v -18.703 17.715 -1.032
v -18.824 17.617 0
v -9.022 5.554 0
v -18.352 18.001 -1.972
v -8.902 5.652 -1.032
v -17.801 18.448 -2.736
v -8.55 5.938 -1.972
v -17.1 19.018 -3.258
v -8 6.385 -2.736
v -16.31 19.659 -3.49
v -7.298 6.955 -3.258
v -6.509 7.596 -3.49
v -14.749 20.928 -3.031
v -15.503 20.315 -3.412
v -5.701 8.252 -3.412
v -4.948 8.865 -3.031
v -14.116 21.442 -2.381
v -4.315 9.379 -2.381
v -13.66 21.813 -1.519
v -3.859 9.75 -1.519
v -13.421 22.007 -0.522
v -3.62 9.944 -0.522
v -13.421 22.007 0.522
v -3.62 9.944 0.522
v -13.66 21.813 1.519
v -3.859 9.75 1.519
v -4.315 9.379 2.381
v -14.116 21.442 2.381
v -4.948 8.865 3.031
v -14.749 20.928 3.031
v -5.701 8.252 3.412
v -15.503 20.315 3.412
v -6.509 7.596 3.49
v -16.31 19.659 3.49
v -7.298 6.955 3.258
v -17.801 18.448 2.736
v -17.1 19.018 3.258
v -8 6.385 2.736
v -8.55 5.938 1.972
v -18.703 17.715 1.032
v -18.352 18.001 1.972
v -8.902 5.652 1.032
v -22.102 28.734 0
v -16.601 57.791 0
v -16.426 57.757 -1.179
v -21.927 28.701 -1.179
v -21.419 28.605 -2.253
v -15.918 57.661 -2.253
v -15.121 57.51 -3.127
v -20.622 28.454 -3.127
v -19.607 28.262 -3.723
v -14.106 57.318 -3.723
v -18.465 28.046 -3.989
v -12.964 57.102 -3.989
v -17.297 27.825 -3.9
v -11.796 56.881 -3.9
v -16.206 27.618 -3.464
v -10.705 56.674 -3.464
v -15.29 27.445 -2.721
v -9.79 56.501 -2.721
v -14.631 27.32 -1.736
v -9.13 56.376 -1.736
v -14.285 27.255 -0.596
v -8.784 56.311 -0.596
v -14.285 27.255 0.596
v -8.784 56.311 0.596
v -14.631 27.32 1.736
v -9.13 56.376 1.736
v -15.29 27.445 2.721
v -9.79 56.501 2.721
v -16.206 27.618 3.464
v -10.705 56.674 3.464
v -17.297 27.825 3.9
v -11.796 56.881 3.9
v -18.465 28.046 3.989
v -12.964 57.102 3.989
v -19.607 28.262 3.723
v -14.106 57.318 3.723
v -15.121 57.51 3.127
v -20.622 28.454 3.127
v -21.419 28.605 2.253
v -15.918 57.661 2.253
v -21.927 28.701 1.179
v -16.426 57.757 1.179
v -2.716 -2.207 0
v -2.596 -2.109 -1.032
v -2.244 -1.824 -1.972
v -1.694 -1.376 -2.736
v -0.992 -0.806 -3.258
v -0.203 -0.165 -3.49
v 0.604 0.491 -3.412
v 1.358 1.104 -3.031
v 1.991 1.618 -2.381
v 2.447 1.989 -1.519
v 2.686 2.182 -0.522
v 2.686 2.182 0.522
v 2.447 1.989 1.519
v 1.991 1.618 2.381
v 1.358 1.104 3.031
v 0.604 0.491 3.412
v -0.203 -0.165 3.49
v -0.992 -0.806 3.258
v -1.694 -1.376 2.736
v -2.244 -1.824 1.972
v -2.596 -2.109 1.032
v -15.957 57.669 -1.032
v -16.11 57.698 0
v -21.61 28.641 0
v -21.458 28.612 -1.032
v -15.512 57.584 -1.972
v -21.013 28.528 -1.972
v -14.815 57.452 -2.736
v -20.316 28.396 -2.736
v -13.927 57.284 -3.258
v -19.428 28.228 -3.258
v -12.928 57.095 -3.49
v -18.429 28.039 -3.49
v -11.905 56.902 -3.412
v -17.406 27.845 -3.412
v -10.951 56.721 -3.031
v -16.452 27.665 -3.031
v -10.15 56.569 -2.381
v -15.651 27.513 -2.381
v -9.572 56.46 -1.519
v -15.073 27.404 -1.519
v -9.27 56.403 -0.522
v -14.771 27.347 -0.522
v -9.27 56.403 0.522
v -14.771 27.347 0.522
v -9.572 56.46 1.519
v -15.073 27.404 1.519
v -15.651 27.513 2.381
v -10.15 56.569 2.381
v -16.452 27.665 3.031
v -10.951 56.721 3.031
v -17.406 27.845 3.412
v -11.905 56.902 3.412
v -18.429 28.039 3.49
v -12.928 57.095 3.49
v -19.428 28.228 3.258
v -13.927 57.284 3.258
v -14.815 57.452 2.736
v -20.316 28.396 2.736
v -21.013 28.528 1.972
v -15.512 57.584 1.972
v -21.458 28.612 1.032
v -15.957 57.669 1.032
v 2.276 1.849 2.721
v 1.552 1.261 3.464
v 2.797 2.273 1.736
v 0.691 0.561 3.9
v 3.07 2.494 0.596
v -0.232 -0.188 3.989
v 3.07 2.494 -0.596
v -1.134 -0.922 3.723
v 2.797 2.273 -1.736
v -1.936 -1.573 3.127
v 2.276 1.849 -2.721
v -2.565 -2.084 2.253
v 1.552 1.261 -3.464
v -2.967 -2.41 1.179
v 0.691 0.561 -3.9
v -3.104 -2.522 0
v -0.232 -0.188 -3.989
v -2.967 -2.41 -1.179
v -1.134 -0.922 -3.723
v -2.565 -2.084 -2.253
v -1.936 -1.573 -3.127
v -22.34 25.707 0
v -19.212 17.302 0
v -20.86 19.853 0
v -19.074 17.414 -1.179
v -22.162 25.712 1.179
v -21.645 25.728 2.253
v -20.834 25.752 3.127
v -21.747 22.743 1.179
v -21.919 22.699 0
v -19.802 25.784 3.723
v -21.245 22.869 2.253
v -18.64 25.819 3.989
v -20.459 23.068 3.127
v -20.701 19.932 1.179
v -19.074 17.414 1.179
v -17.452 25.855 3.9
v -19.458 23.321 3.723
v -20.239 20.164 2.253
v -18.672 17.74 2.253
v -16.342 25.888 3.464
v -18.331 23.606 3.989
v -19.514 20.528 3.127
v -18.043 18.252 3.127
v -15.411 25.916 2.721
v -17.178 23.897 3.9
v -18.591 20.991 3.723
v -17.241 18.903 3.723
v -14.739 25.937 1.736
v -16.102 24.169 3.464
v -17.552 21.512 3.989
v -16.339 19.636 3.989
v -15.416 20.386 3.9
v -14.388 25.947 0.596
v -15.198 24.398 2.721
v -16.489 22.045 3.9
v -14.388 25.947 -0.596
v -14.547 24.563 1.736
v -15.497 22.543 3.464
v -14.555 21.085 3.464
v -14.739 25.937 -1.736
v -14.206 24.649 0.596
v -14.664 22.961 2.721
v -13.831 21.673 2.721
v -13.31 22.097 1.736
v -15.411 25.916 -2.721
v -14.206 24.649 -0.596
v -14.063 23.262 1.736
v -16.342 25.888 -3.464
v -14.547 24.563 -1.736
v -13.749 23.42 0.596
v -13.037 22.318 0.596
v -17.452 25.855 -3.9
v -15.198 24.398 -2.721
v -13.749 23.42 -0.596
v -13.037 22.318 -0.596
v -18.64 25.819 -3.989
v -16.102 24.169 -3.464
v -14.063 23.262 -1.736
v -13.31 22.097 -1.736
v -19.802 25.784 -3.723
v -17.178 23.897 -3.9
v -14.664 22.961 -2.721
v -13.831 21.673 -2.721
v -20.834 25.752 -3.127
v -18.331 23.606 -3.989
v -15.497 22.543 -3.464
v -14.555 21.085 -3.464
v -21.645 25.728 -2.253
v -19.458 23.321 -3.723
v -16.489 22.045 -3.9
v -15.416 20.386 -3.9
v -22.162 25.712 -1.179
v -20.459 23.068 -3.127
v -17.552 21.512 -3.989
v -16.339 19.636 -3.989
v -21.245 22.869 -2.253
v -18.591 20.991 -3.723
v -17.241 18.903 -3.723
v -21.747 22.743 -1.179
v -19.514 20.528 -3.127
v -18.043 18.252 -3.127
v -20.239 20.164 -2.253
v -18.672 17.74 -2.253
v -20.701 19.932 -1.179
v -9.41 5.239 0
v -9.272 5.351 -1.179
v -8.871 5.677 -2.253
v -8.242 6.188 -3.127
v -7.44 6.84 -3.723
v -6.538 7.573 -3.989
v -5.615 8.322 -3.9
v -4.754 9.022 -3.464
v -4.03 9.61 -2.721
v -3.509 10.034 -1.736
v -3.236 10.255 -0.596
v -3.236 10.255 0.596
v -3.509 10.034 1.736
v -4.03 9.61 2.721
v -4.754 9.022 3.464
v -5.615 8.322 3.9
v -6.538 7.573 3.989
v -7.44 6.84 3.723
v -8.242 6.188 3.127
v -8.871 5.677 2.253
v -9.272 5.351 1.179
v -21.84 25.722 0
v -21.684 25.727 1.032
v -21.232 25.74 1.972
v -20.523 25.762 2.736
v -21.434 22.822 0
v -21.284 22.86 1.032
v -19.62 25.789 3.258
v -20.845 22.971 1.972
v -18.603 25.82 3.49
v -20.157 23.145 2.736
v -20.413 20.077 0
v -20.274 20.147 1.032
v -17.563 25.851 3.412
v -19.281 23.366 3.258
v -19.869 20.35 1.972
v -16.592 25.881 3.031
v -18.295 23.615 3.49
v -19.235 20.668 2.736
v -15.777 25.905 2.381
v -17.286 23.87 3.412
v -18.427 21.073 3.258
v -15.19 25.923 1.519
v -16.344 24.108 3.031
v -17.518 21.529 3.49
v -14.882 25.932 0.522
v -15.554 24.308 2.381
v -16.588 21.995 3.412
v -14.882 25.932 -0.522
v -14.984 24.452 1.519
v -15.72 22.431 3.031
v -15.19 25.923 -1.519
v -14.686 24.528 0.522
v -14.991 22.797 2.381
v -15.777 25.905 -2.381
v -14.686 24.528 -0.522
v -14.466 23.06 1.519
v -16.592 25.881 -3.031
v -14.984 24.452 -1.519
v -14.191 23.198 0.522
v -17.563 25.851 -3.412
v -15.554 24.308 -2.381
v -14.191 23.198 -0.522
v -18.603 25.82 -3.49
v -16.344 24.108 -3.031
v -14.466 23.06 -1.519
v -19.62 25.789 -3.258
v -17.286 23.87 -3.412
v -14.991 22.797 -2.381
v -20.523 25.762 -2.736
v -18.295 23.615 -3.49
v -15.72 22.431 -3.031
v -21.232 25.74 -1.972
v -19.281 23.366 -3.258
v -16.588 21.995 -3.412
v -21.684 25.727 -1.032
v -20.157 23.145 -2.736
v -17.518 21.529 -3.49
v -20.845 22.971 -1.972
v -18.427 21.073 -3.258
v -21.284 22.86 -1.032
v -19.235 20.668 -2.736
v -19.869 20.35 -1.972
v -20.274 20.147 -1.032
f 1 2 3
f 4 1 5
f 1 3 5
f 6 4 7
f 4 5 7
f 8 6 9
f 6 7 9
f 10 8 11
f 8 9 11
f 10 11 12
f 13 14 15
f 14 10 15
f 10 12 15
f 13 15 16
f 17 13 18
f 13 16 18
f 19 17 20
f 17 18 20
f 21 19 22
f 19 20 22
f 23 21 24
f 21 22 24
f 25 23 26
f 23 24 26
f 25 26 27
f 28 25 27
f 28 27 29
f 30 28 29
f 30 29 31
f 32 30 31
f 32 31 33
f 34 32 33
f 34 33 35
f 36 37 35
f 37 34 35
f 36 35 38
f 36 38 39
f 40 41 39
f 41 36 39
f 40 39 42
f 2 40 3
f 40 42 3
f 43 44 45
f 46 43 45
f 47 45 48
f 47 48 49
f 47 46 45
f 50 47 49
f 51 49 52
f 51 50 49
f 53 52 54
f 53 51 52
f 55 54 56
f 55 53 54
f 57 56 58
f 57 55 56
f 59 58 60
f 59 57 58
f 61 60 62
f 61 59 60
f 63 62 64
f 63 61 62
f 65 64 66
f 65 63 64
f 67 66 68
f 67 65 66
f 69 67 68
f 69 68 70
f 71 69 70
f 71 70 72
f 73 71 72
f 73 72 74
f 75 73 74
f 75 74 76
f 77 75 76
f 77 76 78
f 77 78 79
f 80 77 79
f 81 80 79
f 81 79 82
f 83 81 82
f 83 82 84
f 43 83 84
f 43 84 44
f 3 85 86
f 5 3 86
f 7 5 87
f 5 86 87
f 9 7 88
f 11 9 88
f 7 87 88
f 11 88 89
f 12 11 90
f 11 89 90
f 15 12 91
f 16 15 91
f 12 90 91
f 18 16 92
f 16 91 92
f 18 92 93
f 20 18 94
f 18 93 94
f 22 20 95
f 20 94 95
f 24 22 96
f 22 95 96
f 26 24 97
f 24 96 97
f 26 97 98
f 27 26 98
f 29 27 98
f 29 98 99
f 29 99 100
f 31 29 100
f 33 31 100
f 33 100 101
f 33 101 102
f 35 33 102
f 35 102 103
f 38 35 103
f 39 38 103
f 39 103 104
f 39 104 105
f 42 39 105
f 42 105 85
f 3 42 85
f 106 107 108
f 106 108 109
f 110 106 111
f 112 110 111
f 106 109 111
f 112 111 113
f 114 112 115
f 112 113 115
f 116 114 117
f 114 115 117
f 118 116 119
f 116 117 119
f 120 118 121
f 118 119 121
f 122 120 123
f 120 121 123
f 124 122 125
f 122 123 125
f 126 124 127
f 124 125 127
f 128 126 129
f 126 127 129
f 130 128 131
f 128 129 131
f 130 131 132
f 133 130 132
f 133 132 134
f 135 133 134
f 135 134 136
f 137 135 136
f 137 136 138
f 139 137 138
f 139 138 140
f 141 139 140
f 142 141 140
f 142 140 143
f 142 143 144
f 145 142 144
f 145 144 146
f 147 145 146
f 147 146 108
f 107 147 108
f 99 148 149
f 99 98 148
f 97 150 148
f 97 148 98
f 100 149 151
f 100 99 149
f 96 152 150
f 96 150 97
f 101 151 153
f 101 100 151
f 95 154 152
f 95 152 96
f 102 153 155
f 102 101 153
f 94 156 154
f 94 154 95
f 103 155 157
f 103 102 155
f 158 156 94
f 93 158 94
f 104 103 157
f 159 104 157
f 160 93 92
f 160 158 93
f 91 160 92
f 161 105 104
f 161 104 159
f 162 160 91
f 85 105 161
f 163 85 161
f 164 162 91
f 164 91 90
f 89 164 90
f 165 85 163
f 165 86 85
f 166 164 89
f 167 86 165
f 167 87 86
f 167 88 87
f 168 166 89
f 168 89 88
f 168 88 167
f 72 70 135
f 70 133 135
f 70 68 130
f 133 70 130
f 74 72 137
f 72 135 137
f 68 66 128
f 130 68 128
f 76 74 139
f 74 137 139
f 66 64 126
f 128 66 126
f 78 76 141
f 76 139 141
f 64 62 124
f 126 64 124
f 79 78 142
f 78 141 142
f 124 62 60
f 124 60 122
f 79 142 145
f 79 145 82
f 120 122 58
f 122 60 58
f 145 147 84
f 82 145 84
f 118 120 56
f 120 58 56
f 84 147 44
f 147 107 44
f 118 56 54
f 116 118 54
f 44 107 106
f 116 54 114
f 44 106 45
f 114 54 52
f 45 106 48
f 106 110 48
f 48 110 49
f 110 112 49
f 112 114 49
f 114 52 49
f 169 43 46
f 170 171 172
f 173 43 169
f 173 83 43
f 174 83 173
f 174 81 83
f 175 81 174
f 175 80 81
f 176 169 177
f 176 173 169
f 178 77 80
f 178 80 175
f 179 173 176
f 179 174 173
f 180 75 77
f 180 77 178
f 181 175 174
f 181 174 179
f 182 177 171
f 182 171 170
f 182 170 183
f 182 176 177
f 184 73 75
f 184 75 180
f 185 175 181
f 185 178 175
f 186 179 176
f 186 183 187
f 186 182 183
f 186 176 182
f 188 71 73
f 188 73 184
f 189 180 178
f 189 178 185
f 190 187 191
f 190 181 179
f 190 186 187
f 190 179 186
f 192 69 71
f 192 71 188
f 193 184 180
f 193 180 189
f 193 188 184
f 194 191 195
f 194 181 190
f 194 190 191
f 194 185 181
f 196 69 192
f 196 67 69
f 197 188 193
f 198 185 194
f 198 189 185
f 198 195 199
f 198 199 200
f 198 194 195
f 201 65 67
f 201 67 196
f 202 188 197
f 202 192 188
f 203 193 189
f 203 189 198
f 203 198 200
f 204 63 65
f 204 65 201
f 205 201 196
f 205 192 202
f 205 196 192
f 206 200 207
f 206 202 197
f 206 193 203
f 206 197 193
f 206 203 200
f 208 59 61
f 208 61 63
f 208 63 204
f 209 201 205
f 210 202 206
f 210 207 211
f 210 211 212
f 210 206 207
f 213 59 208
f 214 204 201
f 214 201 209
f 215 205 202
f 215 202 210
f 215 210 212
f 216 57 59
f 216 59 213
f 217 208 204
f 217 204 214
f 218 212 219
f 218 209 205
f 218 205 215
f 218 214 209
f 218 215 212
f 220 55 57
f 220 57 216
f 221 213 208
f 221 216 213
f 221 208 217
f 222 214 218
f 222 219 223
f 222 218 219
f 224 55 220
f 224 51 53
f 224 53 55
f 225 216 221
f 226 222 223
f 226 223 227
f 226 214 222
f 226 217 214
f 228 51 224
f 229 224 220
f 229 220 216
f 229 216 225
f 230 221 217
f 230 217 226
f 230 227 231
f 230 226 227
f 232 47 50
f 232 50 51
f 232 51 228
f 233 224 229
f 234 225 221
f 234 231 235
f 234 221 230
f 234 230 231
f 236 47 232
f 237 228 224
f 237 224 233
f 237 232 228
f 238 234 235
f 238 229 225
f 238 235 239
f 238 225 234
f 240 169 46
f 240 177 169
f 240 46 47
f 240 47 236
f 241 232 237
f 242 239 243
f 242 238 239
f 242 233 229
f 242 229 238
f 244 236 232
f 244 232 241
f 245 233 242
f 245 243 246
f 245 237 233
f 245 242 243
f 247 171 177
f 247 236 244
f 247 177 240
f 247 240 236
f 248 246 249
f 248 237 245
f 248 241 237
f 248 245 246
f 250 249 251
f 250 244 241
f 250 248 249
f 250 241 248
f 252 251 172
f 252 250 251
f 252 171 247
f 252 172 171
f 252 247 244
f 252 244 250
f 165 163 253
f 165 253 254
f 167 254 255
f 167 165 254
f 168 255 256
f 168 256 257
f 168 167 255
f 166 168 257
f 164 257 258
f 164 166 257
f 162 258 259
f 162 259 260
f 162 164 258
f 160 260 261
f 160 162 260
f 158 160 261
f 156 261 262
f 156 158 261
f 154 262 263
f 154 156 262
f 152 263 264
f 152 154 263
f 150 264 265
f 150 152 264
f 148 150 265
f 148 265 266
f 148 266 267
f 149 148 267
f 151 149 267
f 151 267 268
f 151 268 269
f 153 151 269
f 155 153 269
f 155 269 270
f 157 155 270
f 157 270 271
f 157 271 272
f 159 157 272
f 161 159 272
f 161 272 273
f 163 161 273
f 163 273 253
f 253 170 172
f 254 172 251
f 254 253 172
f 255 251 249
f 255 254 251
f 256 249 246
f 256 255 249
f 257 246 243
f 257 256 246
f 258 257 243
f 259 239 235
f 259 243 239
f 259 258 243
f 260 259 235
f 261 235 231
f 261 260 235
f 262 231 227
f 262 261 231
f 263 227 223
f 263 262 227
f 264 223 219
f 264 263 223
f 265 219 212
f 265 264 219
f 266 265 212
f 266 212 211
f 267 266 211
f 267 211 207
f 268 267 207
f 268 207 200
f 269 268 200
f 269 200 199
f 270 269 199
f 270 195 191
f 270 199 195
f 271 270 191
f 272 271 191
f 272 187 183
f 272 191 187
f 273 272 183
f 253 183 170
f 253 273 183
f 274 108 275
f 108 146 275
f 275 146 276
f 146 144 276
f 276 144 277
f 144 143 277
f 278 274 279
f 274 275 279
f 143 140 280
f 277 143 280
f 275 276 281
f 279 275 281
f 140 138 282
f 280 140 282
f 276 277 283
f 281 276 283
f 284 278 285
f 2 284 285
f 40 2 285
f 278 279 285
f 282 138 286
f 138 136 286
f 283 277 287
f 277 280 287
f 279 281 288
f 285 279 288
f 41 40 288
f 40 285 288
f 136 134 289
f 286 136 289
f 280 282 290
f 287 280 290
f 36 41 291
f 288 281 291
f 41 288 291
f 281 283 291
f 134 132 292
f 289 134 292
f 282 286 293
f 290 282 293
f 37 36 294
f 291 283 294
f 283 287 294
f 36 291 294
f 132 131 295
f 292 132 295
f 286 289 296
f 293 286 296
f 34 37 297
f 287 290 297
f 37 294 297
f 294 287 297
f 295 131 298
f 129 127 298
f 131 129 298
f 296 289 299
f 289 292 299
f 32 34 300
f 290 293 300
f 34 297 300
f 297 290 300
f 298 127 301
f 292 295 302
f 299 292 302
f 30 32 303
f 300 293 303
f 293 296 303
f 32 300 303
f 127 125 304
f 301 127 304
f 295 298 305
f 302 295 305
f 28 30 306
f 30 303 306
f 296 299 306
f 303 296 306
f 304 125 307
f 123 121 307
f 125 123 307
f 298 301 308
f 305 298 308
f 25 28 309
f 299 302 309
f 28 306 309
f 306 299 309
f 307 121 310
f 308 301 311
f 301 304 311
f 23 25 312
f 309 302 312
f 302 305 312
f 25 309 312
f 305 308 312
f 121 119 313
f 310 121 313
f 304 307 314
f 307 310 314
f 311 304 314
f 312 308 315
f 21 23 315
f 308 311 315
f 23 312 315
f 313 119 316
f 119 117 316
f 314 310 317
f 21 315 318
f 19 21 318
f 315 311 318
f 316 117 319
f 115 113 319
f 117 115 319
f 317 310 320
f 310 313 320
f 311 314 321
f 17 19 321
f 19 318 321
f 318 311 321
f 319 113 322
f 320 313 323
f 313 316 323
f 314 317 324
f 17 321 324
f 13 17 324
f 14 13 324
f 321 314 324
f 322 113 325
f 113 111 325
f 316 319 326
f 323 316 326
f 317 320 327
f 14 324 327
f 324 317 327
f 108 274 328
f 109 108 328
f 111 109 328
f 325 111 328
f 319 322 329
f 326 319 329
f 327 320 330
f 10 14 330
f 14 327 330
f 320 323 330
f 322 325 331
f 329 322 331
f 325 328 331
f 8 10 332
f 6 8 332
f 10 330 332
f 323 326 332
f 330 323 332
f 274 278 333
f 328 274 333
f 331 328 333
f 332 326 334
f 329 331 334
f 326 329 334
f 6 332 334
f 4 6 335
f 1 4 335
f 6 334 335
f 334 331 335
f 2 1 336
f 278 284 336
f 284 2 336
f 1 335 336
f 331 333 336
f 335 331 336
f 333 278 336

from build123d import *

# Parameters (mm, degrees)
SKETCH_2_R   = 4
SKETCH_2_R_2 = 3.5


with BuildPart() as part:
    # По траектории1: sweep along a path in Эскиз1
    with BuildLine(Plane.XY) as sweep_1_path:
        Line((-12.67059026, 57.046486939), (-18.171515217, 27.990319213))
        ThreePointArc((-18.171515217, 27.990319213), (-18.041069279, 23.679327915), (-16.107188295, 19.824231748))
        Line((-16.107188295, 19.824231748), (-6.305926251, 7.761140001))
        Line((-6.305926251, 7.761140001), (0, 0))
    # Эскиз2 → По траектории1 (sweep)
    with BuildSketch(Plane(origin=(0, 0, 0), x_dir=(-0.7761140001162656, -0.6305926250944656, 0), z_dir=(0.6305926250944656, -0.7761140001162656, 0))):
        Circle(SKETCH_2_R)
        Circle(SKETCH_2_R_2, mode=Mode.SUBTRACT)
    sweep(path=sweep_1_path.line)


solid = part.part
